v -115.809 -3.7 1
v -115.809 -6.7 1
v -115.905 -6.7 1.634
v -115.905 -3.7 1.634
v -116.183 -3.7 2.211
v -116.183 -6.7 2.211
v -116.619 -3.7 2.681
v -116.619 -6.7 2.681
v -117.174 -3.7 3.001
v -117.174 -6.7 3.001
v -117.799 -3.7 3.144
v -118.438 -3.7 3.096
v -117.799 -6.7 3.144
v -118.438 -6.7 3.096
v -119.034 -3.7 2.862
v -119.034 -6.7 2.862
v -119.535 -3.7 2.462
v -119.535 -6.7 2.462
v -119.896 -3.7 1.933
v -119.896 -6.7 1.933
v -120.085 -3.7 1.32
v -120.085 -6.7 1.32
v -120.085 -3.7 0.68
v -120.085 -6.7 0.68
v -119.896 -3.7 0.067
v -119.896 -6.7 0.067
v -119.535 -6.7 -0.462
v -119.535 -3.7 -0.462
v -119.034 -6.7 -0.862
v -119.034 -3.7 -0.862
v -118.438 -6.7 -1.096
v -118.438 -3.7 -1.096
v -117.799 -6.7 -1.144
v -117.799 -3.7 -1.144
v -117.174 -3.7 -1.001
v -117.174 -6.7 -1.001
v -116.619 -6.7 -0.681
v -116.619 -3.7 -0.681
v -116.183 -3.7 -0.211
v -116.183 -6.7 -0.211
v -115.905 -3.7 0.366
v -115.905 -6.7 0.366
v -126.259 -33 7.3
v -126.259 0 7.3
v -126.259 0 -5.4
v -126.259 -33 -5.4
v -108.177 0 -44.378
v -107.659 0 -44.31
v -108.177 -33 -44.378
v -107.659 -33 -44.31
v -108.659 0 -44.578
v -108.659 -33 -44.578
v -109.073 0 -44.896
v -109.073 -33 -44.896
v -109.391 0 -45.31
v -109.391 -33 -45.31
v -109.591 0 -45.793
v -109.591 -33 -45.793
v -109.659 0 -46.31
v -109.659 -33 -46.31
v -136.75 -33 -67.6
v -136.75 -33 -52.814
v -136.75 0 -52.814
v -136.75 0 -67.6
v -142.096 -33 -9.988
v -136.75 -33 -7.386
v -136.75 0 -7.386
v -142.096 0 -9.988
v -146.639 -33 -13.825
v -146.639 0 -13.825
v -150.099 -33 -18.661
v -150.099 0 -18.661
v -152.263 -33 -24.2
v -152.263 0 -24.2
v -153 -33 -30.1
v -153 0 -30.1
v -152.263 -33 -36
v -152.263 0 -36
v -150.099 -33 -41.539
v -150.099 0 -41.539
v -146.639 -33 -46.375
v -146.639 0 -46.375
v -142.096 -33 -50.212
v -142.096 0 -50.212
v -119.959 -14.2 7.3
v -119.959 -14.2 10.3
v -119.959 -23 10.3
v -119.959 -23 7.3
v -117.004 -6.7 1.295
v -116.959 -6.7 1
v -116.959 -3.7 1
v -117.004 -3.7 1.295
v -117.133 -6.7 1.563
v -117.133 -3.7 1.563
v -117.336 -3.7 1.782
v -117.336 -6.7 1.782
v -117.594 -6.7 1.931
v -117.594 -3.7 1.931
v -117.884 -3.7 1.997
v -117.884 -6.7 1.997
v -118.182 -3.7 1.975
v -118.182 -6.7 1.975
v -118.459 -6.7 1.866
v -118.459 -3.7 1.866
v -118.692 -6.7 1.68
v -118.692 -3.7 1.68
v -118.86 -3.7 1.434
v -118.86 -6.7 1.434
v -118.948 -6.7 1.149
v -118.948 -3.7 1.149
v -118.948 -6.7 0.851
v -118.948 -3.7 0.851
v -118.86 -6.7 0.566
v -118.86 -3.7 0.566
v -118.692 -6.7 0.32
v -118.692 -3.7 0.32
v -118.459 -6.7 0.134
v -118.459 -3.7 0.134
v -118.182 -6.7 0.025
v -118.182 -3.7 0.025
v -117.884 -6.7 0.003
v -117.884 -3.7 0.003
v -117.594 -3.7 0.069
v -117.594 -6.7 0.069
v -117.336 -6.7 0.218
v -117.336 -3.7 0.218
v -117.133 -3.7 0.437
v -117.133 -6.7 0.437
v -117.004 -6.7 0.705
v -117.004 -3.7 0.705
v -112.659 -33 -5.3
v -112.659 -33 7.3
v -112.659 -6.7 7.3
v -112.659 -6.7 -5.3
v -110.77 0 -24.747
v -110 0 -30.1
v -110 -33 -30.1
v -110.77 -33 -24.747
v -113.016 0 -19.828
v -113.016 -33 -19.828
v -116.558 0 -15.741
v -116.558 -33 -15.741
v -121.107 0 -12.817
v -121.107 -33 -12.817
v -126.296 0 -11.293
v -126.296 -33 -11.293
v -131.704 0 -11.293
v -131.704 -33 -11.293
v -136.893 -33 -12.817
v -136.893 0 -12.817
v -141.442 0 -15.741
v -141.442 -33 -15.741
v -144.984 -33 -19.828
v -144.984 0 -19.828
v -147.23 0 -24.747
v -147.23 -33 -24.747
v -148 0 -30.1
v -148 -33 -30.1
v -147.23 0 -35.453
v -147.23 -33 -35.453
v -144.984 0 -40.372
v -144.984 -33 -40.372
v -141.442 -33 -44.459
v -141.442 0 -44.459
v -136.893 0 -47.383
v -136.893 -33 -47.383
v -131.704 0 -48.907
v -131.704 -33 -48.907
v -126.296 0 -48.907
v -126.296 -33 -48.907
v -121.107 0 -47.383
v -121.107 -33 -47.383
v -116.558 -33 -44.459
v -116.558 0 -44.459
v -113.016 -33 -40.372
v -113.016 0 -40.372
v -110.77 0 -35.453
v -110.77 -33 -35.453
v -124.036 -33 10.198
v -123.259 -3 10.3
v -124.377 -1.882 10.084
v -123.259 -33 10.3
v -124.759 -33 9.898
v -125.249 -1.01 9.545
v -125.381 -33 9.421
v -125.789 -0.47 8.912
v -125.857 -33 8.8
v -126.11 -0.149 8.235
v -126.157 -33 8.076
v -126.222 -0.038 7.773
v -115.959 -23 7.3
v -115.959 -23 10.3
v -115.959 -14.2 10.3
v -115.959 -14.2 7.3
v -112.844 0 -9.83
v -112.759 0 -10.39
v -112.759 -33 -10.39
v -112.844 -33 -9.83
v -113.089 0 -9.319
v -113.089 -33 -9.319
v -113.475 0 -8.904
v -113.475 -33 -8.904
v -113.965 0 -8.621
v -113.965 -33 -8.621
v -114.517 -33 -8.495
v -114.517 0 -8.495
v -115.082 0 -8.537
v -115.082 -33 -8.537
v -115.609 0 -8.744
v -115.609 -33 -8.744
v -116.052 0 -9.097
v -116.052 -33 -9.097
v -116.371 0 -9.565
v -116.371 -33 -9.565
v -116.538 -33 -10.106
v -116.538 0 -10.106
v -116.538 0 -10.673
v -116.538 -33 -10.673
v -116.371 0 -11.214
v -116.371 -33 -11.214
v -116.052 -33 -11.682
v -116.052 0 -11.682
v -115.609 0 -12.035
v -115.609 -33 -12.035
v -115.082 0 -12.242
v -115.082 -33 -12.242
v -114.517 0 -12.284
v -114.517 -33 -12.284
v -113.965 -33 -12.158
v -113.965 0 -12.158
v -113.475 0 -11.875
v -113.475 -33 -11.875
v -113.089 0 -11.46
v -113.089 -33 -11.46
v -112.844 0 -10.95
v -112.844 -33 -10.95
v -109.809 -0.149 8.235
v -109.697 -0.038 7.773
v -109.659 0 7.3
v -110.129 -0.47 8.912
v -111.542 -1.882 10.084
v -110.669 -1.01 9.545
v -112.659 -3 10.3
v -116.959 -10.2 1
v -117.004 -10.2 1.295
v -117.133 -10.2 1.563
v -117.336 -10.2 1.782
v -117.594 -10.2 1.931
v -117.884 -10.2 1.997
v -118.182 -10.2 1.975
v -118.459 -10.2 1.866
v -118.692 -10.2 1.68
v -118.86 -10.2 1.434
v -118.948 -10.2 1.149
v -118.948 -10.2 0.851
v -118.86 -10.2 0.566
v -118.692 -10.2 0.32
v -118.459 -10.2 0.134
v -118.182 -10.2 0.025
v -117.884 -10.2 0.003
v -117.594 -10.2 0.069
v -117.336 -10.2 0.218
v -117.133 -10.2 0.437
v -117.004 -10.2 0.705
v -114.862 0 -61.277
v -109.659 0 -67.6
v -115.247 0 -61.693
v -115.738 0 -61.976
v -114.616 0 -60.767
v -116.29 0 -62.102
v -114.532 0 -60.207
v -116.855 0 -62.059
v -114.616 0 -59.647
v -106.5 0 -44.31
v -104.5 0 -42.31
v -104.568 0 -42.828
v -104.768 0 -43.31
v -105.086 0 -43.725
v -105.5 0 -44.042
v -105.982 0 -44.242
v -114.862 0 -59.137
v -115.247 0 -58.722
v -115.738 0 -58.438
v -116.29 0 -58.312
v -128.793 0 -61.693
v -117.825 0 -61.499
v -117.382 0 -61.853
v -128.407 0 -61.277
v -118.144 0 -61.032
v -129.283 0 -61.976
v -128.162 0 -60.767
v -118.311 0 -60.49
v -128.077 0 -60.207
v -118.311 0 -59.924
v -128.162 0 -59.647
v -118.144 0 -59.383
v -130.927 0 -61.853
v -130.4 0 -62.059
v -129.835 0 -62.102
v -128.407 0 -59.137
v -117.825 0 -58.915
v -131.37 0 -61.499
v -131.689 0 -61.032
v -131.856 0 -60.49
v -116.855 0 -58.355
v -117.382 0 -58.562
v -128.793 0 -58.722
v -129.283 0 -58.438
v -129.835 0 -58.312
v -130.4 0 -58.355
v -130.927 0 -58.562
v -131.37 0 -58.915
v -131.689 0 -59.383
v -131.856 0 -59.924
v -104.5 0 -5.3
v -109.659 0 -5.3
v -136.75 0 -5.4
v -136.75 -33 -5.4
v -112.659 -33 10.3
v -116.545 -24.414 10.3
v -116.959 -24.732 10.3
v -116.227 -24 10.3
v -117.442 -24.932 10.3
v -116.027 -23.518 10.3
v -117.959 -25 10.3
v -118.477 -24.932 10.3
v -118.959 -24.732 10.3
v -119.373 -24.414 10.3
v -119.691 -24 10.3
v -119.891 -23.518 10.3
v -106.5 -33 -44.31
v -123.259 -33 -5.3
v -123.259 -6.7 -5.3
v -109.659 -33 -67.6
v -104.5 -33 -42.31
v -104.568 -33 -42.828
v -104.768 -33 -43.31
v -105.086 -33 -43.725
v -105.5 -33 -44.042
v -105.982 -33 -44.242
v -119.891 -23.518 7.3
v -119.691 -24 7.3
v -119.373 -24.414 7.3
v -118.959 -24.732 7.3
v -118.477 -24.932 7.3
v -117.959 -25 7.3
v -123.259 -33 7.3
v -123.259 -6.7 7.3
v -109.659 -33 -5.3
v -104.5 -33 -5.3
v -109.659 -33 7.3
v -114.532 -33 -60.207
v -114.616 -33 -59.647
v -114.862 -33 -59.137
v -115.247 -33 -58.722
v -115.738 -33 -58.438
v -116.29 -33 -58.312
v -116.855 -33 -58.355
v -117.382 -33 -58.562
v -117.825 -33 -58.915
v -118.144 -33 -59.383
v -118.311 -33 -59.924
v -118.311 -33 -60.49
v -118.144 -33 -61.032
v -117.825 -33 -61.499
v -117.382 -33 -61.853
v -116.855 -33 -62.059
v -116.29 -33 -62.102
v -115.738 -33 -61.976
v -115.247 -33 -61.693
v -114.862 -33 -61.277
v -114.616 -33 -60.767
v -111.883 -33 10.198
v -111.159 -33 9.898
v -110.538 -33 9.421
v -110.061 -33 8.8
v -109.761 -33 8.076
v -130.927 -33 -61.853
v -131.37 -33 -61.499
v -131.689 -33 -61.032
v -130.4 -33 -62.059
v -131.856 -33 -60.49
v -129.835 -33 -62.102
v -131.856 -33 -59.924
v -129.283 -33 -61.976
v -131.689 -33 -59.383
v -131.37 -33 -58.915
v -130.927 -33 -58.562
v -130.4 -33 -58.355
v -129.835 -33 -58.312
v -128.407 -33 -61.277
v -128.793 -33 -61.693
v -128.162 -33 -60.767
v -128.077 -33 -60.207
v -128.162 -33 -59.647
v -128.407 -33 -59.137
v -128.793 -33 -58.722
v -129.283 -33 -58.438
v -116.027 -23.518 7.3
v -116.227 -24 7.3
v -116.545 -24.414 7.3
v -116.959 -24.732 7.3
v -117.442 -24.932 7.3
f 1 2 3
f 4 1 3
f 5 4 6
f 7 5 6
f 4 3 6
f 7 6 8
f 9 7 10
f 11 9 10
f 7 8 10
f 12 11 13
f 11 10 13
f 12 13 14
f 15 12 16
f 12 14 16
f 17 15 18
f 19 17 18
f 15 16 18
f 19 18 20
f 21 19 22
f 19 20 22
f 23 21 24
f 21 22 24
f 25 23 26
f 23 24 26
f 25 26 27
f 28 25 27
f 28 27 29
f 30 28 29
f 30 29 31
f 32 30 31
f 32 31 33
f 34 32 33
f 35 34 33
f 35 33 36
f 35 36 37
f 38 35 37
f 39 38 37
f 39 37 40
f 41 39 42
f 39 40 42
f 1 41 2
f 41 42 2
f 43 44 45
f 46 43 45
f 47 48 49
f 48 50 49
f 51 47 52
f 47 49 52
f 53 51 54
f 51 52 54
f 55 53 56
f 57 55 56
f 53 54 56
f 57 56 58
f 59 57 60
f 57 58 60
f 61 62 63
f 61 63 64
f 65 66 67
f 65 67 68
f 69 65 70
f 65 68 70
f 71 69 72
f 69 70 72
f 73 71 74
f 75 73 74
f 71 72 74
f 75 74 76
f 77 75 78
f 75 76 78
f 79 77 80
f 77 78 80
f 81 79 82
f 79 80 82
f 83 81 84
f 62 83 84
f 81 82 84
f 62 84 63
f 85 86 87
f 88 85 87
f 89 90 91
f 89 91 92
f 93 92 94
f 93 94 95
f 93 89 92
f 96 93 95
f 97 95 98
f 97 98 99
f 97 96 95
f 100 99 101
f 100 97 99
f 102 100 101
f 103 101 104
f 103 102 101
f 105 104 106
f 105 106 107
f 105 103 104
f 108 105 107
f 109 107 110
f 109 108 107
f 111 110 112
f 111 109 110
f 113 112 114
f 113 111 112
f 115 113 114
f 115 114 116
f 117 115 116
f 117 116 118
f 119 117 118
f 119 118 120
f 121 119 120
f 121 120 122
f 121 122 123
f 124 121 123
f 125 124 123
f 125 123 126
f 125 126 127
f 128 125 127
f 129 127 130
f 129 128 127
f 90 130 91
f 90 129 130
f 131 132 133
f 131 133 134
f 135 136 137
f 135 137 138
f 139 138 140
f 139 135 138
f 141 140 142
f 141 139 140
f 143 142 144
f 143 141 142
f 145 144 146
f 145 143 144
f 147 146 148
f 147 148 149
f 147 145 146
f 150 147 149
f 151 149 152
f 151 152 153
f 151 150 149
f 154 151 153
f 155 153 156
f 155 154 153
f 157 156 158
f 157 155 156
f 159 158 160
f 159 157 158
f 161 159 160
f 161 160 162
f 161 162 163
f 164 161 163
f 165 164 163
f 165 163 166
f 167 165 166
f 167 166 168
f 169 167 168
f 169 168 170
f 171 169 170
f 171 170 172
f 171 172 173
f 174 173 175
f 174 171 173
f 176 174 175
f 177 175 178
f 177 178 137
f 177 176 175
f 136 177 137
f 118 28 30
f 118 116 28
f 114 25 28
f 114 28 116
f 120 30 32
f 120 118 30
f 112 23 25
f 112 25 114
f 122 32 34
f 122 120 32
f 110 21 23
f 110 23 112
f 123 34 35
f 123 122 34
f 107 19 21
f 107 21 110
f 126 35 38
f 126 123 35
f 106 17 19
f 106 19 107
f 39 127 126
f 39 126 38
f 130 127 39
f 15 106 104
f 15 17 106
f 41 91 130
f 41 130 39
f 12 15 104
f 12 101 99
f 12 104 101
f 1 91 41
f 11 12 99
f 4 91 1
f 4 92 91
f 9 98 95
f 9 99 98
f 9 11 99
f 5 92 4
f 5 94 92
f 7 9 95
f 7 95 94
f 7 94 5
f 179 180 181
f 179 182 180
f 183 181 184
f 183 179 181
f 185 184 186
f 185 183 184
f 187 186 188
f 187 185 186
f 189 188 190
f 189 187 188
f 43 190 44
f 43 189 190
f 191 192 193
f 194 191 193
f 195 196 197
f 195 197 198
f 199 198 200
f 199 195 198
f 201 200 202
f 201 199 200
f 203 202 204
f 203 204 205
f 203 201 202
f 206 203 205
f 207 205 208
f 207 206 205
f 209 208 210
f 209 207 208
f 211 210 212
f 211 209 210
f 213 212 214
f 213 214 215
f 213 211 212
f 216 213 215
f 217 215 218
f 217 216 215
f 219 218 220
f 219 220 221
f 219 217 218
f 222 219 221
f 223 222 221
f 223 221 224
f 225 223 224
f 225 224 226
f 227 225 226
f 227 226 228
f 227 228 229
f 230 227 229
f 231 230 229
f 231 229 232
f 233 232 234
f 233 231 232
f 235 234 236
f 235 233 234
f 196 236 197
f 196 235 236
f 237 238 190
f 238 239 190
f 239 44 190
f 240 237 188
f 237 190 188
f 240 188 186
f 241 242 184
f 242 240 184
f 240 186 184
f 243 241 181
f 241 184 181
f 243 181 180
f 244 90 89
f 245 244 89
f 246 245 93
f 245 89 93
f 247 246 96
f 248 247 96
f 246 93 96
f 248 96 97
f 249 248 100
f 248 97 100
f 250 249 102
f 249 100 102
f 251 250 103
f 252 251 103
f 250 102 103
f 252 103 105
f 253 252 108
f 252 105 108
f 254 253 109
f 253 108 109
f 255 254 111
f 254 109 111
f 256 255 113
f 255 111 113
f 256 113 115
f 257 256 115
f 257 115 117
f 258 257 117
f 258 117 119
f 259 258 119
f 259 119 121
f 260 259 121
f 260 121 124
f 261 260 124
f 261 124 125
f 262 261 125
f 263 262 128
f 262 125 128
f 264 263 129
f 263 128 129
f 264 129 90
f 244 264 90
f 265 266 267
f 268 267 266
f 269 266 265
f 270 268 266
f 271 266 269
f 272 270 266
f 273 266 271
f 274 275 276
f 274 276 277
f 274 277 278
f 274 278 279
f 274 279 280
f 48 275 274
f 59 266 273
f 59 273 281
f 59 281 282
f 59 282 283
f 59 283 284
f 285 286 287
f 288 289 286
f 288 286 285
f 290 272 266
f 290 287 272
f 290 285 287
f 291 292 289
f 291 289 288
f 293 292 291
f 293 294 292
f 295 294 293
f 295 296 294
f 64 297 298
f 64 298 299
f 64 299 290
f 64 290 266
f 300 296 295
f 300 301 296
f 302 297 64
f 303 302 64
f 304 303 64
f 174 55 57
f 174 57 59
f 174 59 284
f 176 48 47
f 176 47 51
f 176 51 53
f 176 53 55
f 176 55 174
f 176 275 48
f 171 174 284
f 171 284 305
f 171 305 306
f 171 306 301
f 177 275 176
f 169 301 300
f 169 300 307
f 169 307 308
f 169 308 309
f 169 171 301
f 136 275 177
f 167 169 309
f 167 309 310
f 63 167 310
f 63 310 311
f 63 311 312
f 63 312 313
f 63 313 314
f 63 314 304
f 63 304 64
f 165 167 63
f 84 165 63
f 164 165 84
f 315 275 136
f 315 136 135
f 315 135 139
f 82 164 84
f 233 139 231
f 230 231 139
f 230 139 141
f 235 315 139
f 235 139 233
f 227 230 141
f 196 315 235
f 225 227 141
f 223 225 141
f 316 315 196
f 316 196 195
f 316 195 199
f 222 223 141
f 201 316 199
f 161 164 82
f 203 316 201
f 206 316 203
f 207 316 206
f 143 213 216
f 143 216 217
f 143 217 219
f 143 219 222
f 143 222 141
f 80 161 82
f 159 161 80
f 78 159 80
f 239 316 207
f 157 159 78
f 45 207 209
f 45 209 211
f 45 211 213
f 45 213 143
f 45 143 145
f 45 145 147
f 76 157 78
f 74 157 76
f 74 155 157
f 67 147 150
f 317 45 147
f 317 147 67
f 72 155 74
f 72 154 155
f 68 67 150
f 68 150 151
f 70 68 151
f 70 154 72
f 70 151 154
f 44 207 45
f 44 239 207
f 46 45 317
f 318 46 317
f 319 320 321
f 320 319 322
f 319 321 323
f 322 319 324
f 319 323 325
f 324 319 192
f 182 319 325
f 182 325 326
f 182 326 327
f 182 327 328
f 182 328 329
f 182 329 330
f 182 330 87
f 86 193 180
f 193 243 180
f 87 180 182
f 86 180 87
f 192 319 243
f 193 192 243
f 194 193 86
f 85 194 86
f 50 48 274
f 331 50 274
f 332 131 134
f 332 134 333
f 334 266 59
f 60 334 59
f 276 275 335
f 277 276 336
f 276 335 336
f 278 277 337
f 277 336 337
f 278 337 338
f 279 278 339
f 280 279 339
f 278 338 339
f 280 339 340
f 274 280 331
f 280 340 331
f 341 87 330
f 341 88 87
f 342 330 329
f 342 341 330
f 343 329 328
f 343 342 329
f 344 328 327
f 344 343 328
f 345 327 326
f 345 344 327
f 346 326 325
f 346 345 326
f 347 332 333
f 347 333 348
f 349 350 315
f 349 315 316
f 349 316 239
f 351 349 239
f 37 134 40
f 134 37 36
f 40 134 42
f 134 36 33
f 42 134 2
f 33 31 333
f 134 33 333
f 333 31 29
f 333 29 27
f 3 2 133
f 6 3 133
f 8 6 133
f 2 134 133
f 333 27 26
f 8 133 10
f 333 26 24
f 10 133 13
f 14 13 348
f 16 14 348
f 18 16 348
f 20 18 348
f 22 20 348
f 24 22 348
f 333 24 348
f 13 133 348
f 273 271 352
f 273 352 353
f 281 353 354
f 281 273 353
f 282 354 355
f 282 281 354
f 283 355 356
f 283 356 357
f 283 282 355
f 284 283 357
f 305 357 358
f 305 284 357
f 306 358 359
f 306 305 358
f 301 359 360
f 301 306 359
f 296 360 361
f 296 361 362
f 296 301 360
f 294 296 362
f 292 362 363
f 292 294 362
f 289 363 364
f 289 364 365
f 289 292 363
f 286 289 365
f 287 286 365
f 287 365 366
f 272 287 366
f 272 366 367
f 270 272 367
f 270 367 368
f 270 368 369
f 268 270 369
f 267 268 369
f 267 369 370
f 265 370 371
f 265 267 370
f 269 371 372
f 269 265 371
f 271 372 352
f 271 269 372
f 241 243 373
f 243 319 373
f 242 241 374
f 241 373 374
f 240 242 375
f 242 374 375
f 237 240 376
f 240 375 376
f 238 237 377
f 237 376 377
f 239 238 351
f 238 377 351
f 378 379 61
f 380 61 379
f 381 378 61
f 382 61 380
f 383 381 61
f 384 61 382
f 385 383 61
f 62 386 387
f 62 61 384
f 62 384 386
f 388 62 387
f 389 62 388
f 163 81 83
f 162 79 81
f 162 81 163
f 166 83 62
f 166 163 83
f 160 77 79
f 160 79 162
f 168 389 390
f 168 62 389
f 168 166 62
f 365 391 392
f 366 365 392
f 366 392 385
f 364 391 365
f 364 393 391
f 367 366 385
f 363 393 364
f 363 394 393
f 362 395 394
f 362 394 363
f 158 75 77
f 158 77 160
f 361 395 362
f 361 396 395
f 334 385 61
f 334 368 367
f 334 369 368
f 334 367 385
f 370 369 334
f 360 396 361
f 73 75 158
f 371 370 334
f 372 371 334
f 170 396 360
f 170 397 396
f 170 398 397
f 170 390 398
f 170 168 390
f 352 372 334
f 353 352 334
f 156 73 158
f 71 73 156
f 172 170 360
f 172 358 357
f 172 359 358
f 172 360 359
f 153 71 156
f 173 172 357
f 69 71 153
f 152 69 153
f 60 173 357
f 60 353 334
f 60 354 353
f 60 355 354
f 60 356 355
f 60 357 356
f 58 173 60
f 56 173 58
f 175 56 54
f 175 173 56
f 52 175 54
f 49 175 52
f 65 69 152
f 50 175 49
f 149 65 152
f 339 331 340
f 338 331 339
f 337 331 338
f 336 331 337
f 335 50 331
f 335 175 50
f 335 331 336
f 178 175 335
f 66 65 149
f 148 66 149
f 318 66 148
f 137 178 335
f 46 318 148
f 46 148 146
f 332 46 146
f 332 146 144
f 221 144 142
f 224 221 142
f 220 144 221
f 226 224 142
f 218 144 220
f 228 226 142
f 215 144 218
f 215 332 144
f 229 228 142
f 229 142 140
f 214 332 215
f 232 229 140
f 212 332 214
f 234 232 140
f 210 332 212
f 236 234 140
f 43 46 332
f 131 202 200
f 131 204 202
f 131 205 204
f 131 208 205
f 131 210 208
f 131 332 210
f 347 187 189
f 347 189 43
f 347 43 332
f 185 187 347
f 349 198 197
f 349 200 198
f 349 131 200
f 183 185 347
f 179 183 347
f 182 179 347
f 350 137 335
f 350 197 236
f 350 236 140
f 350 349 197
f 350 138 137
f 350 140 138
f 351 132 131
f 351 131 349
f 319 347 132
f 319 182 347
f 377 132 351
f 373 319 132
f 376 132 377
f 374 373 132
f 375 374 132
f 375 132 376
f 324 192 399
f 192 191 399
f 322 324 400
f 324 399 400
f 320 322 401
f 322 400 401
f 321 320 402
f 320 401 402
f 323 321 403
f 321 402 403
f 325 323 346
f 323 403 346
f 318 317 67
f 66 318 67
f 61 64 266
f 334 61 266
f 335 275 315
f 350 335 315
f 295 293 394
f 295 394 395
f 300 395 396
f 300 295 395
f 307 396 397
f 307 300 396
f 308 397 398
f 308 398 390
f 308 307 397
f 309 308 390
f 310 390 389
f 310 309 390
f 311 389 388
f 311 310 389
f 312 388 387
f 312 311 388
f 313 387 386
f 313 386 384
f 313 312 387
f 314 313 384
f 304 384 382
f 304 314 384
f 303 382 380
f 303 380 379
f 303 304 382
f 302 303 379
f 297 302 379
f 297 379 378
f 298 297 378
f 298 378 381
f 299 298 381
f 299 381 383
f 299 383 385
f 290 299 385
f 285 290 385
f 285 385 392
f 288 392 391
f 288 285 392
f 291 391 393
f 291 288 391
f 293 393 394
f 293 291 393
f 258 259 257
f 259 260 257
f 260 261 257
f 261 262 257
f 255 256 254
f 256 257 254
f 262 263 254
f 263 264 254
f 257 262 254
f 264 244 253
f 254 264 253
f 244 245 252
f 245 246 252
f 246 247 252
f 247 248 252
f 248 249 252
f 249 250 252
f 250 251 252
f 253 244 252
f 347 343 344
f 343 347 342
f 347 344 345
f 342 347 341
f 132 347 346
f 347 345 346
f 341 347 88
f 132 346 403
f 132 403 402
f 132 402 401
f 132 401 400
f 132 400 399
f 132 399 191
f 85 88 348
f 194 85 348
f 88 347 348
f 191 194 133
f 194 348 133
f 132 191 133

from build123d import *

# Parameters (mm, degrees)
F0_R      = 1.9
F0_R_2    = 19
F1_DEPTH  = 33
F2_W      = 10.6
F2_H      = 12.6
F3_DEPTH  = 6.7
F4_R      = 3
F5_R      = 2
F7_DEPTH  = 8.5
F8_R      = 1.99999
F9_R      = 2.15
F9_R_2    = 1
F10_DEPTH = 3
F11_DEPTH = 3.5


# Not quite as in the source:
# - a fillet or chamfer is up to 0.001 mm smaller than in the source, because OpenCascade refuses the exact size


with BuildPart() as f1:
    # F0 (on Front) → F1 (new body)
    with BuildSketch(Plane.XZ):
        with BuildLine():
            Line((-109.659200659, 0), (-109.659200659, 10.3))
            Line((-109.659200659, 10.3), (-126.259200659, 10.3))
            Line((-126.259200659, 10.3), (-126.259200659, 0))
            Line((-126.259200659, 0), (-126.259200659, -5))
            Line((-126.259200659, -5), (-126.259200659, -5.4))
            Line((-126.259200659, -5.4), (-136.75, -5.4))
            Line((-136.75, -5.4), (-136.75, -7.385742363))
            ThreePointArc((-136.75, -7.385742363), (-153, -30.1), (-136.75, -52.814257637))
            Line((-136.75, -52.814257637), (-136.75, -67.6))
            Line((-136.75, -67.6), (-132.812420773, -67.6))
            Line((-132.812420773, -67.6), (-109.659200659, -67.6))
            Line((-109.659200659, -67.6), (-109.659200659, -44.3103300754))
            Line((-109.659200659, -44.3103300754), (-105, -44.3103300754))
            Line((-105, -44.3103300754), (-104.5, -44.3103300754))
            Line((-104.5, -44.3103300754), (-104.5, -5.3))
            Line((-104.5, -5.3), (-105, -5.3))
            Line((-105, -5.3), (-109.659200659, -5.3))
            Line((-109.659200659, -5.3), (-109.659200659, 0))
        make_face()
        with Locations((-129.9773001648, -60.2071288185)):
            Circle(F0_R, mode=Mode.SUBTRACT)
        with Locations((-129, -30.1)):
            Circle(F0_R_2, mode=Mode.SUBTRACT)
        with Locations((-116.4319004943, -60.2071288185)):
            Circle(F0_R, mode=Mode.SUBTRACT)
        with Locations((-114.659200659, -10.3896699246)):
            Circle(F0_R, mode=Mode.SUBTRACT)
        Polygon((-112.659200659, -5.3), (-117.959200659, -5.3), (-123.259200659, -5.3), (-123.259200659, 7.3), (-112.659200659, 7.3), align=None, mode=Mode.SUBTRACT)
    extrude(amount=F1_DEPTH)

    # F2 (on face) → F3 (join)
    with BuildSketch(Plane(origin=(0, 0, 0), x_dir=(-1, 0, 0), z_dir=(0, 1, 0))):
        with Locations((117.959200659, 1)):
            Rectangle(F2_W, F2_H)
    extrude(amount=-F3_DEPTH)

    # F4
    f4_edges = [f1.edges().sort_by_distance(p)[0] for p in [
        (-109.659201, -16.5, 10.3),
        (-126.259201, -16.5, 10.3),
        (-117.959201, 0, 10.3),
    ]]
    fillet(f4_edges, radius=F4_R)

    # F5
    f5_edges = [f1.edges().sort_by_distance(p)[0] for p in [
        (-104.5, -16.5, -44.31033),
        (-109.659201, -16.5, -44.31033),
    ]]
    fillet(f5_edges, radius=F5_R)

    # F6 (on face) → F7 (cut)
    with BuildSketch(Plane.XY.offset(10.3)):
        Polygon((-119.959200659, -25), (-117.959200659, -25), (-115.959200659, -25), (-115.959200659, -14.2), (-119.959200659, -14.2), align=None)
    extrude(amount=-F7_DEPTH, mode=Mode.SUBTRACT)

    # F8 (radius 2 in the source; OpenCascade refuses exactly that, so slightly less here)
    f8_edges = [f1.edges().sort_by_distance(p)[0] for p in [
        (-119.959201, -25, 8.8),
        (-115.959201, -25, 8.8),
    ]]
    fillet(f8_edges, radius=F8_R)

    # F9 (on face) → F10 (cut)
    with BuildSketch(Plane.XZ.offset(6.7)):
        with Locations((-117.959200659, 1)):
            Circle(F9_R)
        with Locations((-117.959200659, 1)):
            Circle(F9_R_2, mode=Mode.SUBTRACT)
    extrude(amount=-F10_DEPTH, mode=Mode.SUBTRACT)

    # F11 (add): a face of the model
    f11_faces = [f1.faces().sort_by_distance(p)[0] for p in [
        (-117.959200659, -6.7, 1),
    ]]
    extrude(f11_faces, amount=F11_DEPTH)


solid = f1.part
